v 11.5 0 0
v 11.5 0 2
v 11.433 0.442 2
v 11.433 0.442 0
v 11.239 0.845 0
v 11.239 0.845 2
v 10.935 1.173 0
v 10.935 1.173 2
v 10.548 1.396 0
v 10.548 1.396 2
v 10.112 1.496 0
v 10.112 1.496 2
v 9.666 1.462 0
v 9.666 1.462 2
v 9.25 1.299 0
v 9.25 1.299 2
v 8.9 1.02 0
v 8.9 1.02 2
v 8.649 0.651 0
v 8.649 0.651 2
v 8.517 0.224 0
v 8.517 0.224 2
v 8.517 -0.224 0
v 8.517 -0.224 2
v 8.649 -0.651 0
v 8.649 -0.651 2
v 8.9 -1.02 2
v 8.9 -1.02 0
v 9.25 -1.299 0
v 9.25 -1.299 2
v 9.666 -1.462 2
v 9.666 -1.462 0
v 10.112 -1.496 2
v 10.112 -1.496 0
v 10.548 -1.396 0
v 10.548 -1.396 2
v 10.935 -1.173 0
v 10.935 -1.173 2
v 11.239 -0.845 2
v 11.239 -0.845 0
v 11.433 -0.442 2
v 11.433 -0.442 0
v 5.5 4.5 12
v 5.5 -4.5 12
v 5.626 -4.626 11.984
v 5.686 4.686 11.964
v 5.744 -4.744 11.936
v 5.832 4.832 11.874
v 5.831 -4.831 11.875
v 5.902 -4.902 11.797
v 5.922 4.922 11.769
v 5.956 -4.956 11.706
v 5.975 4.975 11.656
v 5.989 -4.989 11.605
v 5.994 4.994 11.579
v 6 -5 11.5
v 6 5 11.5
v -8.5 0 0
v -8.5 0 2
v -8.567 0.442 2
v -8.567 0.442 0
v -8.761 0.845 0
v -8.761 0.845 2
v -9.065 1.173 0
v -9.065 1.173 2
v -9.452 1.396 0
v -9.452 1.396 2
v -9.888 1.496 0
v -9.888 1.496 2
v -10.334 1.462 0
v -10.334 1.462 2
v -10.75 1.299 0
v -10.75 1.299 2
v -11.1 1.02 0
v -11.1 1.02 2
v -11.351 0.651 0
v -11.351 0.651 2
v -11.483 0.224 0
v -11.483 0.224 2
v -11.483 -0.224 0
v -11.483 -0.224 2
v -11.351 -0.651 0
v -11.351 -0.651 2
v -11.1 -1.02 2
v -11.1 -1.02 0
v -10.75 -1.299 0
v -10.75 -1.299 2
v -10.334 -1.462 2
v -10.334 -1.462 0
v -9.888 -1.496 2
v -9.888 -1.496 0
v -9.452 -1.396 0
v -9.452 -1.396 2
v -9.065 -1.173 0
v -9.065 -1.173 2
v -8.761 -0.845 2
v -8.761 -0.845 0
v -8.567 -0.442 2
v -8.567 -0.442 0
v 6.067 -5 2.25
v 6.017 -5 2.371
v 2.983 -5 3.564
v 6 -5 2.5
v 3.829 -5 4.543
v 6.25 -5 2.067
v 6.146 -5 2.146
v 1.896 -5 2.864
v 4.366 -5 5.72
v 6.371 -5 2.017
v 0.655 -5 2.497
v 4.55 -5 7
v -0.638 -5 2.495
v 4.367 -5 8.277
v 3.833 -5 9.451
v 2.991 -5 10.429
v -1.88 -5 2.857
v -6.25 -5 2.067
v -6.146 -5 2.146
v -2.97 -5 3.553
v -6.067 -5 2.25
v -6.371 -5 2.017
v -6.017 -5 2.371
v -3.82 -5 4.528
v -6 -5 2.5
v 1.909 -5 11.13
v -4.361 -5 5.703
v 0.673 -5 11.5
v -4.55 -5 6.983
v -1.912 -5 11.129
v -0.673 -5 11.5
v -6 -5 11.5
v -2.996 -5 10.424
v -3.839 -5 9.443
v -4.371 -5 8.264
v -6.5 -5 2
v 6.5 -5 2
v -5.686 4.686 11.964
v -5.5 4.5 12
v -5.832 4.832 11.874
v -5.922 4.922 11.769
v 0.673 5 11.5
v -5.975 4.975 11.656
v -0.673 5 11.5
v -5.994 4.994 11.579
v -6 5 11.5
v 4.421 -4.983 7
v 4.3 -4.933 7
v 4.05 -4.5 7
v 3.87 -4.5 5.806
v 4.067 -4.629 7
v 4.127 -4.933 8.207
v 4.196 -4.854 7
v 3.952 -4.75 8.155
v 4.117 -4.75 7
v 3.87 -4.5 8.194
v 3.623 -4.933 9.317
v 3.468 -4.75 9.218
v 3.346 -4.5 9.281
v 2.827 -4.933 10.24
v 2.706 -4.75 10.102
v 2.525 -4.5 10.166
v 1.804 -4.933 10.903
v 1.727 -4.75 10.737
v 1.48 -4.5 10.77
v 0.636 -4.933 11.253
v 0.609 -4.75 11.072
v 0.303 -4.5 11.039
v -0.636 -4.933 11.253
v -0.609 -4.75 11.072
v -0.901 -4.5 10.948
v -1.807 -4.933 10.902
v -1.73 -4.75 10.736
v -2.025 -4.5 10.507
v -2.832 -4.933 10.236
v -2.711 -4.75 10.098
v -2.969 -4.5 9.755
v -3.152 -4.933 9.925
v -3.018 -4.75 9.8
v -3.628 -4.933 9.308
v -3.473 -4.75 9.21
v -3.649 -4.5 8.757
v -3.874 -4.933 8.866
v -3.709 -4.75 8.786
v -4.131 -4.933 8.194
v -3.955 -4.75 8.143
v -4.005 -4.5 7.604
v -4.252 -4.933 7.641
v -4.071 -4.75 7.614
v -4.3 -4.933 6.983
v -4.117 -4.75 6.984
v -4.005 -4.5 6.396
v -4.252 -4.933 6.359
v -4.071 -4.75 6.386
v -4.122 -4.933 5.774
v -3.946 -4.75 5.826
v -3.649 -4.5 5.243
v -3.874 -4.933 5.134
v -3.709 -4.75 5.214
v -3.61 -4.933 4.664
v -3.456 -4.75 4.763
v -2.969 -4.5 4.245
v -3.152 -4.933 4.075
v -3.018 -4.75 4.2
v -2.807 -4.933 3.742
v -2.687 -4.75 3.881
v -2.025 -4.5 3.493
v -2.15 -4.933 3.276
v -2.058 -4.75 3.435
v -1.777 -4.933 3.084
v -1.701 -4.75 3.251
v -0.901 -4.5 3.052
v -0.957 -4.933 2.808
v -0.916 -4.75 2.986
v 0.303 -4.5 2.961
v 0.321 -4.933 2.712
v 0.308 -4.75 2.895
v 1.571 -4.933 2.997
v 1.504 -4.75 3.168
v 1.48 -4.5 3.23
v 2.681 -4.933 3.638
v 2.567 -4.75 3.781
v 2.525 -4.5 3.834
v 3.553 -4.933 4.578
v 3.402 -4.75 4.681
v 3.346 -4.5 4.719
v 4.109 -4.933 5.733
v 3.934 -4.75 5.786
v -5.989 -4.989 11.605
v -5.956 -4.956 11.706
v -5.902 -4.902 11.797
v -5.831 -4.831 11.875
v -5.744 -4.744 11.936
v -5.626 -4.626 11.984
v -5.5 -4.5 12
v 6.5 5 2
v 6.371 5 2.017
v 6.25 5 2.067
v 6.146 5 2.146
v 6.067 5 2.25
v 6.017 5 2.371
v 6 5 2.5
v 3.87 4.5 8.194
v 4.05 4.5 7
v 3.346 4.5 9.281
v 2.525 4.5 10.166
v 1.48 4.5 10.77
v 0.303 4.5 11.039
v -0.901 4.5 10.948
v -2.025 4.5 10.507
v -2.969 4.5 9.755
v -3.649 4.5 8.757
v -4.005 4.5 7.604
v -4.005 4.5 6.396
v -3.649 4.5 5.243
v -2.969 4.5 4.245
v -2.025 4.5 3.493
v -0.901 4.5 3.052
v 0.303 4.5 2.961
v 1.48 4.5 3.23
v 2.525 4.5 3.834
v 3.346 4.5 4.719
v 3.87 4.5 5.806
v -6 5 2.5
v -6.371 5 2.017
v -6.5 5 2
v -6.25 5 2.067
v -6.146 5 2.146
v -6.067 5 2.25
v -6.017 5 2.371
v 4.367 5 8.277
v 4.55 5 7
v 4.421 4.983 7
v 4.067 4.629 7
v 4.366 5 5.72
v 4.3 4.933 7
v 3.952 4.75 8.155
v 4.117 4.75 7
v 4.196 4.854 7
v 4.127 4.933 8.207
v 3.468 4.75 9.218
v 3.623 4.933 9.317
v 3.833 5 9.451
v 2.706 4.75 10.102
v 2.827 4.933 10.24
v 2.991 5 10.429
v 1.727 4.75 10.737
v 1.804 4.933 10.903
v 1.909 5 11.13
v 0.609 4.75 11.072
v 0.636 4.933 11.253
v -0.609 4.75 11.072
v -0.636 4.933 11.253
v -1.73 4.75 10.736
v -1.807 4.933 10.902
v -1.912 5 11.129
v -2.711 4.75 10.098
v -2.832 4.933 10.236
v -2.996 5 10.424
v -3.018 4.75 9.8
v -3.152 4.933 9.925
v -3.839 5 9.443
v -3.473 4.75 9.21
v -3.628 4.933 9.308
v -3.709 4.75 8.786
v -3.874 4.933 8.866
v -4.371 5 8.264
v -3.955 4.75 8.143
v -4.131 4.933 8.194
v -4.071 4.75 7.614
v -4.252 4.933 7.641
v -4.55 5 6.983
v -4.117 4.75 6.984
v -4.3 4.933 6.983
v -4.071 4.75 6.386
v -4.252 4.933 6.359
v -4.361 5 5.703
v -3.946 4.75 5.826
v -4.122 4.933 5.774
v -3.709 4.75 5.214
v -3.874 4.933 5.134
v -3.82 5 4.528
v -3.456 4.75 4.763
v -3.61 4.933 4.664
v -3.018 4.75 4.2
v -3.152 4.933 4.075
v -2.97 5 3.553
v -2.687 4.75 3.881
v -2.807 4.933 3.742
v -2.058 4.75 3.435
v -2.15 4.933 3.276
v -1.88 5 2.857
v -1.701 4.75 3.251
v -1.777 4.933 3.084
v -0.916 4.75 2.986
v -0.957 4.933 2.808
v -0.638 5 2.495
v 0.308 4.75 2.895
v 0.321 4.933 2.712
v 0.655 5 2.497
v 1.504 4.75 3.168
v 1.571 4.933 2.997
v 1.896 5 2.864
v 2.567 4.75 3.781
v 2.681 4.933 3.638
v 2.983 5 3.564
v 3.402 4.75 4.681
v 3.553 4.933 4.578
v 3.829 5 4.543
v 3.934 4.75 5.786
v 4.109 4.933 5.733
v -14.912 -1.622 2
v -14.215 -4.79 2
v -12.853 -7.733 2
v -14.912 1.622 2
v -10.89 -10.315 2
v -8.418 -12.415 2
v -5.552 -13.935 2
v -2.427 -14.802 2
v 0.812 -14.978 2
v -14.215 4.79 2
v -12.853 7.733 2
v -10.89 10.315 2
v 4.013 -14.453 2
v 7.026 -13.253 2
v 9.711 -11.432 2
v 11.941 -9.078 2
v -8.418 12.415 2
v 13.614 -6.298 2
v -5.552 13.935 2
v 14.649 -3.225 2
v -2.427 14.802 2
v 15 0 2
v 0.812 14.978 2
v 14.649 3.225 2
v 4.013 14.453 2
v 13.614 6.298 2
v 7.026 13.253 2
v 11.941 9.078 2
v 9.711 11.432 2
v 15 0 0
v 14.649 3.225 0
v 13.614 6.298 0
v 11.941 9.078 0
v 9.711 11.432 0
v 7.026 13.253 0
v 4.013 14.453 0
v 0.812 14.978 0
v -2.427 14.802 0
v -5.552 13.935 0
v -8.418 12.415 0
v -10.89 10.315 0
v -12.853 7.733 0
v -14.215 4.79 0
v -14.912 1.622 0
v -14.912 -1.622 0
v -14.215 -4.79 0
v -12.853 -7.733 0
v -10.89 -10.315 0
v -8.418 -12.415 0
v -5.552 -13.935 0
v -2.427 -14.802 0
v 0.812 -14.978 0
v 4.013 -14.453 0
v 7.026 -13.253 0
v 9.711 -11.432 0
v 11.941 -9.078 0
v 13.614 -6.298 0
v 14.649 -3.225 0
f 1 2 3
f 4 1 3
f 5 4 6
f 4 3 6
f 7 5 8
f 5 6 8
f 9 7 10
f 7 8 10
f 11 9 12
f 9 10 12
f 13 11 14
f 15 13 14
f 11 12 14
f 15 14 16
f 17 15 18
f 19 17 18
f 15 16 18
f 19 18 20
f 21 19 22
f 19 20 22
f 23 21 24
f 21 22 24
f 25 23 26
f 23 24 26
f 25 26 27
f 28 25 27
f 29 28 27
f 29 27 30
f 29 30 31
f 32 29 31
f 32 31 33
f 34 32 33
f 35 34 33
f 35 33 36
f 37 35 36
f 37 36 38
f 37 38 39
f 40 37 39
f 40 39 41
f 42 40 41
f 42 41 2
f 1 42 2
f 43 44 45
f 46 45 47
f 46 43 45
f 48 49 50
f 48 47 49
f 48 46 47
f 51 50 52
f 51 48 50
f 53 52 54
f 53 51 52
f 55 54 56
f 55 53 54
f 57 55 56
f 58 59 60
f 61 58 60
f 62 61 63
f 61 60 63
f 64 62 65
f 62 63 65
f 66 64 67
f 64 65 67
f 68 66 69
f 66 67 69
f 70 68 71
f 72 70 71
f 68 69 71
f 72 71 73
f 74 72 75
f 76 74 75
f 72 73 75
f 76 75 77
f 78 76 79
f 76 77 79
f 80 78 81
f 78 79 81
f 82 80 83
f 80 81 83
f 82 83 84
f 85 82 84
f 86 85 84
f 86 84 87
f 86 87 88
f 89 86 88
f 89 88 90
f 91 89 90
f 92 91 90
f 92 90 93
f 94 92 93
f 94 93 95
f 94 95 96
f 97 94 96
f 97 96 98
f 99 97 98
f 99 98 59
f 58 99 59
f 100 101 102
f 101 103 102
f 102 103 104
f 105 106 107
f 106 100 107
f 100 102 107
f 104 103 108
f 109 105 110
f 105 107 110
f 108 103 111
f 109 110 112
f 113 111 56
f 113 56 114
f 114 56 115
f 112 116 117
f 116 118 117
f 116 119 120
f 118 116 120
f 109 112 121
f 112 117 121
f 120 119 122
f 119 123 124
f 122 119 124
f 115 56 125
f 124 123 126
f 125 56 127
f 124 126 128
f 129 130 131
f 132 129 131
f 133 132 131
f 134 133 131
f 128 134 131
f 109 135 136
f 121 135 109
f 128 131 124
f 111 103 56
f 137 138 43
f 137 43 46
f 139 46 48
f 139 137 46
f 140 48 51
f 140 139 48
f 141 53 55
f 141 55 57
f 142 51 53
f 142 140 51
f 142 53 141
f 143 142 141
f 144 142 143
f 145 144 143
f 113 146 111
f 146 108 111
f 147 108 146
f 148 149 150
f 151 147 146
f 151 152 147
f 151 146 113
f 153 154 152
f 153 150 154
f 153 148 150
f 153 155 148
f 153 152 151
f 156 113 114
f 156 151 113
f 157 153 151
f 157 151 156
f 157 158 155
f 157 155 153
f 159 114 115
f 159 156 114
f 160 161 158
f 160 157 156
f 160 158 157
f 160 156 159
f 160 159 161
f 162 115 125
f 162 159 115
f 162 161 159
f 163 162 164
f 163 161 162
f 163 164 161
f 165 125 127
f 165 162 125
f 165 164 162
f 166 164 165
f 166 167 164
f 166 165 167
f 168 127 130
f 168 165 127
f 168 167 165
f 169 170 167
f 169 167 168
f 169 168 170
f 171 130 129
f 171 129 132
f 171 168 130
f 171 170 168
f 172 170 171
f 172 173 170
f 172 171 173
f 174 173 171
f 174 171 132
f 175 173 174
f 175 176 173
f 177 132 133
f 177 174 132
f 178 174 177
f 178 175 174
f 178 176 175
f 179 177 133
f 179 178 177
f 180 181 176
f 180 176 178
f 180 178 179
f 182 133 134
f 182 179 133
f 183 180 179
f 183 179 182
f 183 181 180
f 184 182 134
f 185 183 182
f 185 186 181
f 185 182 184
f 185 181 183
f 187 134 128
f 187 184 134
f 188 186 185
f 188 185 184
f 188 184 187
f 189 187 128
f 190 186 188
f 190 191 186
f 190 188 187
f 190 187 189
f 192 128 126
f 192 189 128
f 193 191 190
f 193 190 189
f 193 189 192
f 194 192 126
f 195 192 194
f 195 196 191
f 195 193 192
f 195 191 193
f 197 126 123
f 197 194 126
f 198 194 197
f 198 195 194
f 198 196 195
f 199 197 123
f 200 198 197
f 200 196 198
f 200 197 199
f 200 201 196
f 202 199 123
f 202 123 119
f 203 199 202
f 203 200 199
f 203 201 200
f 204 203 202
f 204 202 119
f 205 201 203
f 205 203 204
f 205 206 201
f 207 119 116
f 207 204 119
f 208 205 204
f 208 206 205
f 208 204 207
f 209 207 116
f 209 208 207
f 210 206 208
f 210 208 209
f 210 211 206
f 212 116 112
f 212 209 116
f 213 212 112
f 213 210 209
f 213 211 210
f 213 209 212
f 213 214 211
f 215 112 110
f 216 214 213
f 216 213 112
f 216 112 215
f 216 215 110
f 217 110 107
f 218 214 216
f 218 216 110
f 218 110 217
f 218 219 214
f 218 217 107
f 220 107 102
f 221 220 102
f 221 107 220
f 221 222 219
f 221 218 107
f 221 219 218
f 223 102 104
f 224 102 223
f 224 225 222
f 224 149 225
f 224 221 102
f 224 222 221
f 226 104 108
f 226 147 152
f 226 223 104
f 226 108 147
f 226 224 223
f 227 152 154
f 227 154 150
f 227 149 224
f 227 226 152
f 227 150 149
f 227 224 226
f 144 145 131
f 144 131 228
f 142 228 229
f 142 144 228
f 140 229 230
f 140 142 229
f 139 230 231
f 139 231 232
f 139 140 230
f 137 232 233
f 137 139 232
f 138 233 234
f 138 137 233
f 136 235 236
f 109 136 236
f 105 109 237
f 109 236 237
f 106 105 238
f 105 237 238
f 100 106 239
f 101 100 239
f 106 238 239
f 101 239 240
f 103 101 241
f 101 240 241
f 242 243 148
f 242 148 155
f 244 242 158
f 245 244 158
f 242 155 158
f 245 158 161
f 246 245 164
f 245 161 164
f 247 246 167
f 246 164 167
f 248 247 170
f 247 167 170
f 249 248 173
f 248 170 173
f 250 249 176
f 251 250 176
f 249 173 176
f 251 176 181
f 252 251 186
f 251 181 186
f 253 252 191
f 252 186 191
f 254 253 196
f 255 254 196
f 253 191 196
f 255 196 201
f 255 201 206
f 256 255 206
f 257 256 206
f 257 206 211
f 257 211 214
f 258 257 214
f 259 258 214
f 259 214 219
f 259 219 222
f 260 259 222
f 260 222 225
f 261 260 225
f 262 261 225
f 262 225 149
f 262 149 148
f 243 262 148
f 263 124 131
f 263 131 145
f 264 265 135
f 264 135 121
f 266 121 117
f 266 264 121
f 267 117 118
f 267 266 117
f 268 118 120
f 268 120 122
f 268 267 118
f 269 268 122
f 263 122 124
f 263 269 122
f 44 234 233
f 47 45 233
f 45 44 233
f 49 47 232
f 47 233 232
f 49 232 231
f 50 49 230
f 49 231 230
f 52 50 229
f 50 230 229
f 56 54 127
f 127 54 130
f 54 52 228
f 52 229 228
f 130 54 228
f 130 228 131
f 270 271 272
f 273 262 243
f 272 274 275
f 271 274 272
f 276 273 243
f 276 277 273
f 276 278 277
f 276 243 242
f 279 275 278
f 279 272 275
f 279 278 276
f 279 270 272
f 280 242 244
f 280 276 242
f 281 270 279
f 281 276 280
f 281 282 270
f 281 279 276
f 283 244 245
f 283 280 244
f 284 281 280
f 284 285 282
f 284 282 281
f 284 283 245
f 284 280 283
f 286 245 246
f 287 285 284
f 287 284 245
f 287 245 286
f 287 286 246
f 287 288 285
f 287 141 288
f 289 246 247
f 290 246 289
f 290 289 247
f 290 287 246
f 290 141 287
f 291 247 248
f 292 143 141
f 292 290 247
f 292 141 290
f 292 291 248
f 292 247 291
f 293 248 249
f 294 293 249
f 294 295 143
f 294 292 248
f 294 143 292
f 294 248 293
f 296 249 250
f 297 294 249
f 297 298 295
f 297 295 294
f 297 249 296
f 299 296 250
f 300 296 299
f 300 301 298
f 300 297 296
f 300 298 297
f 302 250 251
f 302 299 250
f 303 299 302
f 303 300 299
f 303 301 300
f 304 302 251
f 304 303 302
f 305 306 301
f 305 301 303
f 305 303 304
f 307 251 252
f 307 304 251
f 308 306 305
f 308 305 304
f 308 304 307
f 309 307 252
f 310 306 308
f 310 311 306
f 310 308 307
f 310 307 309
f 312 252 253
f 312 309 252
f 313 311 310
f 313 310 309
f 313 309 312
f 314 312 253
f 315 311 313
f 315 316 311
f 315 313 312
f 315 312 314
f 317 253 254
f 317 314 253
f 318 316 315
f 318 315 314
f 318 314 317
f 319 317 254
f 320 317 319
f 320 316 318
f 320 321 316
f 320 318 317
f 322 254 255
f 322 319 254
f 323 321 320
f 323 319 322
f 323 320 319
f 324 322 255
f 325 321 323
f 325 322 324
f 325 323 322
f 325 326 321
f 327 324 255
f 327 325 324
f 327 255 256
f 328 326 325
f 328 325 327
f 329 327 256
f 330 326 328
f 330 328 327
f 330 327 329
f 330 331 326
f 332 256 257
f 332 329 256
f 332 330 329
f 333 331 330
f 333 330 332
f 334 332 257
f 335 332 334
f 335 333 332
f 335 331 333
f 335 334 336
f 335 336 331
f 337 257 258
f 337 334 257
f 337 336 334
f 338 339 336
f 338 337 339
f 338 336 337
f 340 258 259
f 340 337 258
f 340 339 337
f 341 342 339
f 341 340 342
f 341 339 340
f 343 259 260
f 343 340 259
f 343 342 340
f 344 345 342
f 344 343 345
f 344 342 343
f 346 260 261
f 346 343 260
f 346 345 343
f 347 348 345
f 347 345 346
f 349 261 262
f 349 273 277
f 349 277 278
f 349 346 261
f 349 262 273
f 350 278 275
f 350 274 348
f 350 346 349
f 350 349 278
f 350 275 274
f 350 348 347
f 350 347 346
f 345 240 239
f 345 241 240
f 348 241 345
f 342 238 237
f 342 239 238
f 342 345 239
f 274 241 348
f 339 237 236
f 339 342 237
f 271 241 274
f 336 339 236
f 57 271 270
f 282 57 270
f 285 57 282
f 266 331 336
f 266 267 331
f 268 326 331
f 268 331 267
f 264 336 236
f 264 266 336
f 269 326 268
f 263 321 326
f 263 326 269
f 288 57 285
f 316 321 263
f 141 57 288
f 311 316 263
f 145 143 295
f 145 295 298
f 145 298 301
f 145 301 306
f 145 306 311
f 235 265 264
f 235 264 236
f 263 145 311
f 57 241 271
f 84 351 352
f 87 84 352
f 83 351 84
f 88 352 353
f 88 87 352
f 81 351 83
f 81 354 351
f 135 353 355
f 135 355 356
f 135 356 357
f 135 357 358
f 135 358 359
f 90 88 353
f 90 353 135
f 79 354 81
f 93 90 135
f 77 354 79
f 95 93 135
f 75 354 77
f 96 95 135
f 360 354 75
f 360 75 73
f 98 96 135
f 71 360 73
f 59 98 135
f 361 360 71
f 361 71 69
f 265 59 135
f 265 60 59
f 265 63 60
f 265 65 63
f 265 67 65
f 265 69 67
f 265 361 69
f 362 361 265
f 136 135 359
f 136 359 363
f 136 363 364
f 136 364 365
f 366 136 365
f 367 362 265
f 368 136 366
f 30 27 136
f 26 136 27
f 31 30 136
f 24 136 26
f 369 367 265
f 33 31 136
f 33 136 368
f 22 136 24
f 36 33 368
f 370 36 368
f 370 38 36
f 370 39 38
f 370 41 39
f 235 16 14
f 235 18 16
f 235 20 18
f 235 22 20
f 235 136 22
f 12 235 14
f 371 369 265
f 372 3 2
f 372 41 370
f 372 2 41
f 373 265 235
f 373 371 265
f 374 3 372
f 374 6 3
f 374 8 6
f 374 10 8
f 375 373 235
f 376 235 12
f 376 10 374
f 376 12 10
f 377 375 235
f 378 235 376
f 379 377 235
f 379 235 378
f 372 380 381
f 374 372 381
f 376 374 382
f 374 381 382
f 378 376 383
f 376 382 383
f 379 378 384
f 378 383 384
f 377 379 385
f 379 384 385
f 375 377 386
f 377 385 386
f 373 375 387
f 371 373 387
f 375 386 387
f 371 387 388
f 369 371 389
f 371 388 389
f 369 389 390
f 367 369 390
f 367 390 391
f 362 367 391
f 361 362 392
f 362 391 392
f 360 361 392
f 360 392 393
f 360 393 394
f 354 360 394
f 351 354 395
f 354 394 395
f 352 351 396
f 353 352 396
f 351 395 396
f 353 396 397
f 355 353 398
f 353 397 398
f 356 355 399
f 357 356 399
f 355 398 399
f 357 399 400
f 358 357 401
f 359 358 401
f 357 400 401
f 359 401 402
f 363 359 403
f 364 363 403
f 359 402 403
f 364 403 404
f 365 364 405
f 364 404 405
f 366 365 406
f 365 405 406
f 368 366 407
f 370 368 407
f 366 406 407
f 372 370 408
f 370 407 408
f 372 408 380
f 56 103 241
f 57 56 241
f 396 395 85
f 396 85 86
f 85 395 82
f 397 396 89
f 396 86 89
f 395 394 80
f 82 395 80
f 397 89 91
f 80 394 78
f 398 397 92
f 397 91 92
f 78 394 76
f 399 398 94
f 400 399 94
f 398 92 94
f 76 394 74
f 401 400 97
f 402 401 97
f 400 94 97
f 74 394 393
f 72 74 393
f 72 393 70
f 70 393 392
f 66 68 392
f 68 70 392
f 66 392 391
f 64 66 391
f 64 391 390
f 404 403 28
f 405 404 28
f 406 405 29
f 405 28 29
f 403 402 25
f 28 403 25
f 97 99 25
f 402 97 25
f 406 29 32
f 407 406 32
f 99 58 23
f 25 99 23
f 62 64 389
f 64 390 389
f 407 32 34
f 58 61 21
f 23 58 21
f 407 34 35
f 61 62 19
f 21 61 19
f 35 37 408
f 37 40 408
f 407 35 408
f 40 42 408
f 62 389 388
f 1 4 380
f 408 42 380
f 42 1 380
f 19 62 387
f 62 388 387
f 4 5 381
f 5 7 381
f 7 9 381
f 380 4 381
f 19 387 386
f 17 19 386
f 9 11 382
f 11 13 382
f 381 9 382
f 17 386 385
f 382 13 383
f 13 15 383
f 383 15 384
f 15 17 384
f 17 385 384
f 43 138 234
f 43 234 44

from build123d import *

# Parameters (mm, degrees)
F0_R        = 15
F1_DEPTH    = 2
F2_W        = 12
F2_H        = 10
F3_DEPTH    = 10
F4_R        = 4.05
F5_DEPTH    = 20.001
F6_R        = 1.5
F7_DEPTH    = 2.001
F8_T1_DEPTH = 10
F8_T3_DEPTH = 14.5
F8_T5_DEPTH = 12.5


# Not quite as in the source:
# - a fillet or chamfer that OpenCascade refuses, or shapes differently, is made with other operations: its cross-section is extruded or revolved along the edge and cut away or added


with BuildPart() as f1:
    # F0 (on Top) → F1 (new body)
    with BuildSketch(Plane.XY):
        Circle(F0_R)
    extrude(amount=F1_DEPTH)

    # F2 (on face) → F3 (join)
    with BuildSketch(Plane.XY.offset(2)):
        Rectangle(F2_W, F2_H)
    extrude(amount=F3_DEPTH)

    # F4 (on face) → F5 (cut, through all)
    with BuildSketch(Plane.XZ.offset(5)):
        with Locations((0, 7)):
            Circle(F4_R)
    extrude(amount=-F5_DEPTH, mode=Mode.SUBTRACT)

    # F6 (on face) → F7 (cut, through all)
    with BuildSketch(Plane.XY.offset(2)):
        with Locations((10, 0)):
            Circle(F6_R)
        with Locations((-10, 0)):
            Circle(F6_R)
    extrude(amount=-F7_DEPTH, mode=Mode.SUBTRACT)

    # F8: fillet of radius 0.5 on 8 edges, made by hand

    # F8_s2 → F8_t1 (join)
    with BuildSketch(Plane.XZ.offset(-5)):
        with BuildLine():
            ThreePointArc((-6.5, 2), (-6.1464466094, 2.1464466094), (-6, 2.5))
            Line((-6, 2.5), (-6, 2))
            Line((-6, 2), (-6.5, 2))
        make_face()
        with BuildLine():
            ThreePointArc((6.5, 2), (6.1464466094, 2.1464466094), (6, 2.5))
            Line((6, 2.5), (6, 2))
            Line((6, 2), (6.5, 2))
        make_face()
    extrude(amount=F8_T1_DEPTH)

    # F8_s4 → F8_t3 (cut)
    with BuildSketch(Plane.YZ.offset(-7.25)):
        with BuildLine():
            ThreePointArc((-4.5, 12), (-4.8535533906, 11.8535533906), (-5, 11.5))
            Line((-5, 11.5), (-5, 12))
            Line((-5, 12), (-4.5, 12))
        make_face()
        with BuildLine():
            ThreePointArc((4.5, 12), (4.8535533906, 11.8535533906), (5, 11.5))
            Line((5, 11.5), (5, 12))
            Line((5, 12), (4.5, 12))
        make_face()
    extrude(amount=F8_T3_DEPTH, mode=Mode.SUBTRACT)

    # F8_s6 → F8_t5 (cut)
    with BuildSketch(Plane.XZ.offset(-6.25)):
        with BuildLine():
            ThreePointArc((5.5, 12), (5.8535533906, 11.8535533906), (6, 11.5))
            Line((6, 11.5), (6, 12))
            Line((6, 12), (5.5, 12))
        make_face()
        with BuildLine():
            ThreePointArc((-6, 11.5), (-5.8535533906, 11.8535533906), (-5.5, 12))
            Line((-5.5, 12), (-6, 12))
            Line((-6, 12), (-6, 11.5))
        make_face()
    extrude(amount=F8_T5_DEPTH, mode=Mode.SUBTRACT)

    # F8_s7 → F8_t8 (revolve, cut)
    with BuildSketch(Plane.XY.offset(7)):
        with BuildLine():
            ThreePointArc((4.05, 4.5), (4.1964466094, 4.8535533906), (4.55, 5))
            Line((4.55, 5), (4.05, 5))
            Line((4.05, 5), (4.05, 4.5))
        make_face()
    revolve(axis=Axis((0, 5, 7), (0, -1, 0)), mode=Mode.SUBTRACT)

    # F8_s9 → F8_t10 (revolve, cut)
    with BuildSketch(Plane.XY.offset(7)):
        with BuildLine():
            ThreePointArc((4.55, -5), (4.1964466094, -4.8535533906), (4.05, -4.5))
            Line((4.05, -4.5), (4.05, -5))
            Line((4.05, -5), (4.55, -5))
        make_face()
    revolve(axis=Axis((0, -5, 7), (0, -1, 0)), mode=Mode.SUBTRACT)


solid = f1.part
